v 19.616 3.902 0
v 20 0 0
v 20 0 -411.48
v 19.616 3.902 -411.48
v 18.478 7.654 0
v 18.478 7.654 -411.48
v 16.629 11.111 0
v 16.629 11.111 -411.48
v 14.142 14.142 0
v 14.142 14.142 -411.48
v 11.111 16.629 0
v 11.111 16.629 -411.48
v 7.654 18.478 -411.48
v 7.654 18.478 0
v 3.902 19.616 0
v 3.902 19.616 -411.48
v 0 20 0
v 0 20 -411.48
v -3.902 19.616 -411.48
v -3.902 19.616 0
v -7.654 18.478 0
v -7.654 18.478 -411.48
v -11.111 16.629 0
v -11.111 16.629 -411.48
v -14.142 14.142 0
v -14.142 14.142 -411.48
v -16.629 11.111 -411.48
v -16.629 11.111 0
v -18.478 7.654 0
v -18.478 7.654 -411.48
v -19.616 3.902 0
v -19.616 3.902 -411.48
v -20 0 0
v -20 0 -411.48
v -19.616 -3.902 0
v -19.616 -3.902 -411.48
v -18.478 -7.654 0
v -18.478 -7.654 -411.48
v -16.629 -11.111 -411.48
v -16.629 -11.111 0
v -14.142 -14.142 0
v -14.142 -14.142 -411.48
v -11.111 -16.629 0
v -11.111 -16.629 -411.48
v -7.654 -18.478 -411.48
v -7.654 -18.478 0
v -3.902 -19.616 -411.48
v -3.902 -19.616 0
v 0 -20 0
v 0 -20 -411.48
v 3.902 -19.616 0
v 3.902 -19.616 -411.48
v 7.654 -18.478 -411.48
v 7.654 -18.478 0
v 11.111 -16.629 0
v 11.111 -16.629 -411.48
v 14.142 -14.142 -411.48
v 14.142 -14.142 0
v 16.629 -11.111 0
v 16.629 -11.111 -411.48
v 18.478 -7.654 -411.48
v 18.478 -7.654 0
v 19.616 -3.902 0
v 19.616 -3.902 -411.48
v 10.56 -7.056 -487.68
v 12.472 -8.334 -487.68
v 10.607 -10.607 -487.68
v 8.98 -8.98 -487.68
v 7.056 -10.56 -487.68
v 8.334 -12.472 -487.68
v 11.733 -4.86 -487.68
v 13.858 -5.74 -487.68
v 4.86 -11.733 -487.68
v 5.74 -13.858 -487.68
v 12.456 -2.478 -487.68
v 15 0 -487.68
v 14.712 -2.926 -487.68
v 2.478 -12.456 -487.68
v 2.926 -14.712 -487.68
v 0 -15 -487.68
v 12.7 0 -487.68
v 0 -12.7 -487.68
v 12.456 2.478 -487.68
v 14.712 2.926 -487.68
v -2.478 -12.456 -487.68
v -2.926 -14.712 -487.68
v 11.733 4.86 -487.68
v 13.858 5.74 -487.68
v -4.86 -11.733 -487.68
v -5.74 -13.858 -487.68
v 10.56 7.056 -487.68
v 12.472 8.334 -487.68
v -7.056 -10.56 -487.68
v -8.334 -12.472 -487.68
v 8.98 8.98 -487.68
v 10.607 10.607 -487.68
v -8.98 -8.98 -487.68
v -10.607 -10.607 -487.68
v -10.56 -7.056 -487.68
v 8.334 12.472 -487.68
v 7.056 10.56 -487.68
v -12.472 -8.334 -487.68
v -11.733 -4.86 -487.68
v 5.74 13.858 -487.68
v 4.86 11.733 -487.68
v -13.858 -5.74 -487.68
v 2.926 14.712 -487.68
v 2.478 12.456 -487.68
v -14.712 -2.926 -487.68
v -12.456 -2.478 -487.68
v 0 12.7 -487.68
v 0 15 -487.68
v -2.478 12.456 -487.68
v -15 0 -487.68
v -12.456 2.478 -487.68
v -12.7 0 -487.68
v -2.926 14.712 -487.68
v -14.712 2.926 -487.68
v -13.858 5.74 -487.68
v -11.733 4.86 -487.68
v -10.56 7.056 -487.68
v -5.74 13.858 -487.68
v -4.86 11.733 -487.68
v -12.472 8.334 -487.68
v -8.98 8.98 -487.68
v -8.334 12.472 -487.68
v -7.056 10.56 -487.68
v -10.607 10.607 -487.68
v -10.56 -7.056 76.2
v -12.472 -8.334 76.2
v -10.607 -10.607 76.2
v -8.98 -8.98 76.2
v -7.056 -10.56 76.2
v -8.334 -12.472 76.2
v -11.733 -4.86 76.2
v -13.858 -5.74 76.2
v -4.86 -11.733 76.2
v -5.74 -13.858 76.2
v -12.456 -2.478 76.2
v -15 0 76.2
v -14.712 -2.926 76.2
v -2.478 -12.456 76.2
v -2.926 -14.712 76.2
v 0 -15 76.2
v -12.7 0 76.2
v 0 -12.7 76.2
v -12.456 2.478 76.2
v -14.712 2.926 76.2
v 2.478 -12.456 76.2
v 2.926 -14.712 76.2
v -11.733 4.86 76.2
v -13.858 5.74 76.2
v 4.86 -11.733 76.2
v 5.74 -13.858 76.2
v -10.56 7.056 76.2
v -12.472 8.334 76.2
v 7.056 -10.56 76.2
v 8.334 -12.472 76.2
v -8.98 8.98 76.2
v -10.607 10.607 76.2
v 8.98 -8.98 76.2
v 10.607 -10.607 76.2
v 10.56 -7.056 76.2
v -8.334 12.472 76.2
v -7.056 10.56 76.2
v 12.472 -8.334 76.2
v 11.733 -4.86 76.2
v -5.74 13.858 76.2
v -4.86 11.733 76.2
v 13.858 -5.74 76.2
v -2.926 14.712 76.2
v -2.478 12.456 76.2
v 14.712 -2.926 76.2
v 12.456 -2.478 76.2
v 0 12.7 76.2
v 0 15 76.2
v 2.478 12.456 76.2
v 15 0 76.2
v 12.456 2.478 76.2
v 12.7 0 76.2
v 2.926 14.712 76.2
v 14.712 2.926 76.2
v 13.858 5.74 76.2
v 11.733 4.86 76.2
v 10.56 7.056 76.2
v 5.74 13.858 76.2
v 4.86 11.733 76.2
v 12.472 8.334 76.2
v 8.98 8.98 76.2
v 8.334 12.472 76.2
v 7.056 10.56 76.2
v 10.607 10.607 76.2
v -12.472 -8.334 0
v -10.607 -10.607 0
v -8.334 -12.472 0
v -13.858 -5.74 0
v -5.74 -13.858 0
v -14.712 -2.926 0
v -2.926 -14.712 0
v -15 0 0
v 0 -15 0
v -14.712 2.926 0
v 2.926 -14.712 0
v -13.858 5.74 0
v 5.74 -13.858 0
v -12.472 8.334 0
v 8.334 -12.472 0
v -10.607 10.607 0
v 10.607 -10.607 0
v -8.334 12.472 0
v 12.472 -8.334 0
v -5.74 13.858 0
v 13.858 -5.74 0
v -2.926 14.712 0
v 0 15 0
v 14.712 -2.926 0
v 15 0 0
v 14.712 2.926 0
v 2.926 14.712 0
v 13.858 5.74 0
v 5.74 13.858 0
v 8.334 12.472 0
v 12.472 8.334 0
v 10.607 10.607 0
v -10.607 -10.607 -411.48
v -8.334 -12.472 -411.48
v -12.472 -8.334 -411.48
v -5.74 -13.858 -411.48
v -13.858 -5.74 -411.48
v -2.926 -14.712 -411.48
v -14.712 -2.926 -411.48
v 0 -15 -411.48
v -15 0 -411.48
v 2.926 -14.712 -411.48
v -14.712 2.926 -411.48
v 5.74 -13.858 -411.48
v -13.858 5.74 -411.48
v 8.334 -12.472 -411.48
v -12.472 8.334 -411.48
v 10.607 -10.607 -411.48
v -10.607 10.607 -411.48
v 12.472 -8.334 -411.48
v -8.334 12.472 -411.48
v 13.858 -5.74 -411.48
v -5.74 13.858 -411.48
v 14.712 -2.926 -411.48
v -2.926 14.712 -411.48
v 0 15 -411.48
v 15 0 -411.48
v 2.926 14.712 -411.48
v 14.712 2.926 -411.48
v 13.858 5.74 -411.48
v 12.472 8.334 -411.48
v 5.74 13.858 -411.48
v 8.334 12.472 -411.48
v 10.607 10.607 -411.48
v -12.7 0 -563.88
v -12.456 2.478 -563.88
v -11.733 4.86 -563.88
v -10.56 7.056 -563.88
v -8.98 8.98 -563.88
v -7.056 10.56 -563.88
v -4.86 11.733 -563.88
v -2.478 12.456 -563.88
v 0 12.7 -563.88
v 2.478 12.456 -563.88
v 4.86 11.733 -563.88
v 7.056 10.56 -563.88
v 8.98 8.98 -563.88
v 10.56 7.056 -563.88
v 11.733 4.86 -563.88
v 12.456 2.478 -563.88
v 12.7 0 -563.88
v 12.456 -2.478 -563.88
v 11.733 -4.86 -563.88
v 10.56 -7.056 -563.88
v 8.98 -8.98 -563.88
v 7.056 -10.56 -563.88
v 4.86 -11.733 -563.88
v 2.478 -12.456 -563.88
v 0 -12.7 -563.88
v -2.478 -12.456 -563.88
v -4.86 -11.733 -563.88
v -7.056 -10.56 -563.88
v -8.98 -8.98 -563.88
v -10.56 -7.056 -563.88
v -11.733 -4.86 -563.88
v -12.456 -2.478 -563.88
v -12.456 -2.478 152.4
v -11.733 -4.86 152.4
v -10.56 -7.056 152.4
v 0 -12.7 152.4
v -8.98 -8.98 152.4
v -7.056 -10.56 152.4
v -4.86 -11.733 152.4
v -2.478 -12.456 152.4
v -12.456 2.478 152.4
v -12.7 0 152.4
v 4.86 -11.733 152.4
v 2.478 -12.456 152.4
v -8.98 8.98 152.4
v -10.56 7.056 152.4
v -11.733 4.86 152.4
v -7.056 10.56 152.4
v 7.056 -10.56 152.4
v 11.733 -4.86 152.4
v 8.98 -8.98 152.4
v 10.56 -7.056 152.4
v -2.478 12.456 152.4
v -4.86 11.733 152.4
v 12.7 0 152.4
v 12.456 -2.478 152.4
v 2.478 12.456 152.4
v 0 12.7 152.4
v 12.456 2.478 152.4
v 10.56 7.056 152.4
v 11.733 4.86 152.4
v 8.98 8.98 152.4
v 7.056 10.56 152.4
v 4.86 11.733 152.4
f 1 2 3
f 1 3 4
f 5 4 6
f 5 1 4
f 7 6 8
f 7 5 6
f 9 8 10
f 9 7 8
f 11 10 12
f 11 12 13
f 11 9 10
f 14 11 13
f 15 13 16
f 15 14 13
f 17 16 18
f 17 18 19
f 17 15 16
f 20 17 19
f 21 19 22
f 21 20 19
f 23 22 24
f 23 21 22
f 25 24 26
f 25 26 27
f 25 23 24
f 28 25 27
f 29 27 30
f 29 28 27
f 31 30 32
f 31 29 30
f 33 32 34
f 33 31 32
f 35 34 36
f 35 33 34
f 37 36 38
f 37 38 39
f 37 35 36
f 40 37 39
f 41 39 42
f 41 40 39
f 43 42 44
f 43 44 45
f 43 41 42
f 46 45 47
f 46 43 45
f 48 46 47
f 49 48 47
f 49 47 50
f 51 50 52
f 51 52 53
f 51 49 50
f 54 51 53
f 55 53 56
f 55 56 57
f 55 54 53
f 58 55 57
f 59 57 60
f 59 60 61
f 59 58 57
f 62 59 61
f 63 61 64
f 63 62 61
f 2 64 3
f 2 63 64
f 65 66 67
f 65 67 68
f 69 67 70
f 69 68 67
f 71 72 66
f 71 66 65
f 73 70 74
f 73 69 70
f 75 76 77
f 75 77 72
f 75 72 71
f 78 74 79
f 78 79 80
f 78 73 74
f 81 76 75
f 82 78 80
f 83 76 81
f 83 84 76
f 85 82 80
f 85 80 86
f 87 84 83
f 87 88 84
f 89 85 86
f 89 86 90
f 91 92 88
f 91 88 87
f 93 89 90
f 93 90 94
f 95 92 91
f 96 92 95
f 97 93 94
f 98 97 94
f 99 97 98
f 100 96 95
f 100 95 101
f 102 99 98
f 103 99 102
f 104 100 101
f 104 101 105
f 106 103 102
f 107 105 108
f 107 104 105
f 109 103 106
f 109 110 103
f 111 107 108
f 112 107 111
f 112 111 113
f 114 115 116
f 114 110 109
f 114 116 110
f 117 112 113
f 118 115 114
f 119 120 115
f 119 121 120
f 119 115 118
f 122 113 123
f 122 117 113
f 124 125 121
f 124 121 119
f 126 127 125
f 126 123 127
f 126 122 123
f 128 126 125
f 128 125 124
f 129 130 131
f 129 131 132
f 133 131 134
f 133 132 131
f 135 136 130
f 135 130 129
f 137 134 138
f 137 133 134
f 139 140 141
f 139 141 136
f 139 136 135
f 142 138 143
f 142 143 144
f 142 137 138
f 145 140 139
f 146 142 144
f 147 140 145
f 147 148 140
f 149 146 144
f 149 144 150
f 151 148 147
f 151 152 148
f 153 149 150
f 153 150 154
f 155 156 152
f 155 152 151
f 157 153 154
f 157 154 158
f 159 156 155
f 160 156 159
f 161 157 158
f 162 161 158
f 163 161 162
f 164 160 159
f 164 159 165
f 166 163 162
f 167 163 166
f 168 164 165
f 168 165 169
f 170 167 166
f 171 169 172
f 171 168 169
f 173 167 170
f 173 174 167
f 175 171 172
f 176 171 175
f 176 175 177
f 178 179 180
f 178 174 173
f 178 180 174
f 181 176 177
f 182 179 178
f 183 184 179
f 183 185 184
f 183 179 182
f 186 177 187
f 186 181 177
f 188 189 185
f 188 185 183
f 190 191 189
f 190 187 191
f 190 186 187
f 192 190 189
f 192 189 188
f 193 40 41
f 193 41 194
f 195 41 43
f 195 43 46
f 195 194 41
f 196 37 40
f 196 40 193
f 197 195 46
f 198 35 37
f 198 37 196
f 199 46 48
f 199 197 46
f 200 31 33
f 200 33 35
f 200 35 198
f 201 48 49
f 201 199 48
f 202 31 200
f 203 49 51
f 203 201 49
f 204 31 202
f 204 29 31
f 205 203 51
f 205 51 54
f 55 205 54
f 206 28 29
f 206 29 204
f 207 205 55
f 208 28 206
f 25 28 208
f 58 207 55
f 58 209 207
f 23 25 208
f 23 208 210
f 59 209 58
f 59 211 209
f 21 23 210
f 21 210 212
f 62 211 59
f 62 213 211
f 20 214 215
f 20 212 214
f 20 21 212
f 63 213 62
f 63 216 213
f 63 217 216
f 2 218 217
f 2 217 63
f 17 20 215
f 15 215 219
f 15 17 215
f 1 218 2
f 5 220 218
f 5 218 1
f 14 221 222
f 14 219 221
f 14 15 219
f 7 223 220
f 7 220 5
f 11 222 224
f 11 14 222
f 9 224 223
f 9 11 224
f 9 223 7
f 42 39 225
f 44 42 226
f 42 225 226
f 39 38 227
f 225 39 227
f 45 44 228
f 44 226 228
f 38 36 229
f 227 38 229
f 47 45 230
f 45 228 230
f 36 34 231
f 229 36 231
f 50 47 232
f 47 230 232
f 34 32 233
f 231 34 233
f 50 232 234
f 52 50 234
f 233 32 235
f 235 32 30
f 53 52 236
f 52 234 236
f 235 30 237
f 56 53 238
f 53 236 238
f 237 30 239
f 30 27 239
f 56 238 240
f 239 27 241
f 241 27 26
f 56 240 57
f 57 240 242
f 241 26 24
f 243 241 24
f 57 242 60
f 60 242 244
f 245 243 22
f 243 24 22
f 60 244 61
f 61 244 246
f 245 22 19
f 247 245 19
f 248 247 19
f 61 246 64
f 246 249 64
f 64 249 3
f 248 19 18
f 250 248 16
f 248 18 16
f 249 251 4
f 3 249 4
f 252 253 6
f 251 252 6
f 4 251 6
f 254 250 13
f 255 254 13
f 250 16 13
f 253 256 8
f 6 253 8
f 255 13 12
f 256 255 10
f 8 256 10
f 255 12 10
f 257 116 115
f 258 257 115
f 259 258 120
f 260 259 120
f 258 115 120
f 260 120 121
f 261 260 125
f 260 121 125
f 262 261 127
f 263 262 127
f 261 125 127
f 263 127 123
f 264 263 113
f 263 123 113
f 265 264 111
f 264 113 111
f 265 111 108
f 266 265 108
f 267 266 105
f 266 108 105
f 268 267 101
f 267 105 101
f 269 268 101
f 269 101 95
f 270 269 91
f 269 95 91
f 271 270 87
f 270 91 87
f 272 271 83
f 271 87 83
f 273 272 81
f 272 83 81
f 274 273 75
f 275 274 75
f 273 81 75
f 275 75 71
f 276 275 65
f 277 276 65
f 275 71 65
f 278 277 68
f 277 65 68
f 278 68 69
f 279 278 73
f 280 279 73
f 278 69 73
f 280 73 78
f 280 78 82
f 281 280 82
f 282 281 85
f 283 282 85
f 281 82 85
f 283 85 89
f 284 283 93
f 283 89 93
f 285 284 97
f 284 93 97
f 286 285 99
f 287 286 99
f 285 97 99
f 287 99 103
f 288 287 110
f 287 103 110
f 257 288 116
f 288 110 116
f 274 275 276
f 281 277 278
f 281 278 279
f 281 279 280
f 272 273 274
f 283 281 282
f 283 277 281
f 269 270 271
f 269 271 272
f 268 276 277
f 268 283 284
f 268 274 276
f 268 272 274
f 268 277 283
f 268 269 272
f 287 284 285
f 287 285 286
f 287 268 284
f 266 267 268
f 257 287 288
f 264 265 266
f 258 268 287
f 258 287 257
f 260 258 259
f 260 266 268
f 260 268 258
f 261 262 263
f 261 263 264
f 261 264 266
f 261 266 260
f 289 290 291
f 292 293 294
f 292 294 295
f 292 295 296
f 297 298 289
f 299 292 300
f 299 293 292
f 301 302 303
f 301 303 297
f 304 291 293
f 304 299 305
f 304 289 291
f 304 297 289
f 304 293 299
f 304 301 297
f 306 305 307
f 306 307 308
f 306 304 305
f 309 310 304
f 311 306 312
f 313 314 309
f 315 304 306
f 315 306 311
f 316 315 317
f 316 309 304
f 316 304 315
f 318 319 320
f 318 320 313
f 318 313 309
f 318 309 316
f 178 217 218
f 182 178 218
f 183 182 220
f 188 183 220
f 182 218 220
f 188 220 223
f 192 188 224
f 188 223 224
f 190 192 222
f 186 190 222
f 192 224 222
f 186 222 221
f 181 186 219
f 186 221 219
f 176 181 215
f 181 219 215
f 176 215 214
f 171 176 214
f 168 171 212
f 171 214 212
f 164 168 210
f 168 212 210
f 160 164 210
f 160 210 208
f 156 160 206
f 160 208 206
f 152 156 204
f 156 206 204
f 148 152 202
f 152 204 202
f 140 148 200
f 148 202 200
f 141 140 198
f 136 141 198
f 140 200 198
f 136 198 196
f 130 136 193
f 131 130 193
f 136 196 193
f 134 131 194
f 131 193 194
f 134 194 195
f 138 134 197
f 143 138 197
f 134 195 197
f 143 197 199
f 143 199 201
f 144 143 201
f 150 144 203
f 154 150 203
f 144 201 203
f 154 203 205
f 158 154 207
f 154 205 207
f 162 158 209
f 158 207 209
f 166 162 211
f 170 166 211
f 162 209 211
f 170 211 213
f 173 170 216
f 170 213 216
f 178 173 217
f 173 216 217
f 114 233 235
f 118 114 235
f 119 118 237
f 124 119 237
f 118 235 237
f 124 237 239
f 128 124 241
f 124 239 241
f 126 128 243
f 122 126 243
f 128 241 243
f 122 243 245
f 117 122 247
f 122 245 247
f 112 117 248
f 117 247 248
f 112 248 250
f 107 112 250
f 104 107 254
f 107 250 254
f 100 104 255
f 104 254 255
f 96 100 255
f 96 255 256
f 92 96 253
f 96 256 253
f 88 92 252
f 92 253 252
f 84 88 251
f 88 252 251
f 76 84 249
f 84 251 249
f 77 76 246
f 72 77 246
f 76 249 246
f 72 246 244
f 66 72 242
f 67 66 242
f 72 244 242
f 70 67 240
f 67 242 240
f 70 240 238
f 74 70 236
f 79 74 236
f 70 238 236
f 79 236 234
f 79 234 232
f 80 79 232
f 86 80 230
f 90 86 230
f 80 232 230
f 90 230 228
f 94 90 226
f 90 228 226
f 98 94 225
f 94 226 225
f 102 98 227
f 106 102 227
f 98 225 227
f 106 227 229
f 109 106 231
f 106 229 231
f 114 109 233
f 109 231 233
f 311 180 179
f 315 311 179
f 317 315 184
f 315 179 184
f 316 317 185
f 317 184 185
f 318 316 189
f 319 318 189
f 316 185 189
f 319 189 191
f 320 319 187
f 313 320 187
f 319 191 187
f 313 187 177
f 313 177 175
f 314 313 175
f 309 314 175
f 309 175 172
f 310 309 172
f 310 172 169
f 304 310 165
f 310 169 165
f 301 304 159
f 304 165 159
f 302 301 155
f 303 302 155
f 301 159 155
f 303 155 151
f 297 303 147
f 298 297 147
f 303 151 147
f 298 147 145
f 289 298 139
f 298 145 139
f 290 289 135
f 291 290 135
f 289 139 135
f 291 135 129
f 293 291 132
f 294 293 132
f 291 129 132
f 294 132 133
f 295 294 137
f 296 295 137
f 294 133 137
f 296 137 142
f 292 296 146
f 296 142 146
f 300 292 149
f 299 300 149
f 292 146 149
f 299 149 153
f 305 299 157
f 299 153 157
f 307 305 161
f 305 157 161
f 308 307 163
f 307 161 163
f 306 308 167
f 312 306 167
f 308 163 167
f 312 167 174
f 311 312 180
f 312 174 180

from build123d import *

# Parameters (mm, degrees)
SKETCH1_R           = 20
BOSS_EXTRUDE1_DEPTH = 411.48
SKETCH2_R           = 15
BOSS_EXTRUDE2_DEPTH = 76.2
SKETCH3_R           = 15
BOSS_EXTRUDE3_DEPTH = 76.2
SKETCH4_R           = 12.7
BOSS_EXTRUDE4_DEPTH = 76.2
SKETCH5_R           = 12.7
BOSS_EXTRUDE5_DEPTH = 76.2


with BuildPart() as part:
    # Sketch1 → Boss-Extrude1 (new body)
    with BuildSketch(Plane.XY):
        Circle(SKETCH1_R)
    extrude(amount=-BOSS_EXTRUDE1_DEPTH)

    # Sketch2 → Boss-Extrude2 (add)
    with BuildSketch(Plane.XY):
        Circle(SKETCH2_R)
    extrude(amount=BOSS_EXTRUDE2_DEPTH)

    # Sketch3 → Boss-Extrude3 (add)
    with BuildSketch(Plane(origin=(0, 0, -411.48), x_dir=(-1, 0, 0), z_dir=(0, 0, -1))):
        Circle(SKETCH3_R)
    extrude(amount=BOSS_EXTRUDE3_DEPTH)

    # Sketch4 → Boss-Extrude4 (add)
    with BuildSketch(Plane.XY.offset(76.2)):
        Circle(SKETCH4_R)
    extrude(amount=BOSS_EXTRUDE4_DEPTH)

    # Sketch5 → Boss-Extrude5 (add)
    with BuildSketch(Plane(origin=(0, 0, -487.68), x_dir=(-1, 0, 0), z_dir=(0, 0, -1))):
        Circle(SKETCH5_R)
    extrude(amount=BOSS_EXTRUDE5_DEPTH)


solid = part.part
